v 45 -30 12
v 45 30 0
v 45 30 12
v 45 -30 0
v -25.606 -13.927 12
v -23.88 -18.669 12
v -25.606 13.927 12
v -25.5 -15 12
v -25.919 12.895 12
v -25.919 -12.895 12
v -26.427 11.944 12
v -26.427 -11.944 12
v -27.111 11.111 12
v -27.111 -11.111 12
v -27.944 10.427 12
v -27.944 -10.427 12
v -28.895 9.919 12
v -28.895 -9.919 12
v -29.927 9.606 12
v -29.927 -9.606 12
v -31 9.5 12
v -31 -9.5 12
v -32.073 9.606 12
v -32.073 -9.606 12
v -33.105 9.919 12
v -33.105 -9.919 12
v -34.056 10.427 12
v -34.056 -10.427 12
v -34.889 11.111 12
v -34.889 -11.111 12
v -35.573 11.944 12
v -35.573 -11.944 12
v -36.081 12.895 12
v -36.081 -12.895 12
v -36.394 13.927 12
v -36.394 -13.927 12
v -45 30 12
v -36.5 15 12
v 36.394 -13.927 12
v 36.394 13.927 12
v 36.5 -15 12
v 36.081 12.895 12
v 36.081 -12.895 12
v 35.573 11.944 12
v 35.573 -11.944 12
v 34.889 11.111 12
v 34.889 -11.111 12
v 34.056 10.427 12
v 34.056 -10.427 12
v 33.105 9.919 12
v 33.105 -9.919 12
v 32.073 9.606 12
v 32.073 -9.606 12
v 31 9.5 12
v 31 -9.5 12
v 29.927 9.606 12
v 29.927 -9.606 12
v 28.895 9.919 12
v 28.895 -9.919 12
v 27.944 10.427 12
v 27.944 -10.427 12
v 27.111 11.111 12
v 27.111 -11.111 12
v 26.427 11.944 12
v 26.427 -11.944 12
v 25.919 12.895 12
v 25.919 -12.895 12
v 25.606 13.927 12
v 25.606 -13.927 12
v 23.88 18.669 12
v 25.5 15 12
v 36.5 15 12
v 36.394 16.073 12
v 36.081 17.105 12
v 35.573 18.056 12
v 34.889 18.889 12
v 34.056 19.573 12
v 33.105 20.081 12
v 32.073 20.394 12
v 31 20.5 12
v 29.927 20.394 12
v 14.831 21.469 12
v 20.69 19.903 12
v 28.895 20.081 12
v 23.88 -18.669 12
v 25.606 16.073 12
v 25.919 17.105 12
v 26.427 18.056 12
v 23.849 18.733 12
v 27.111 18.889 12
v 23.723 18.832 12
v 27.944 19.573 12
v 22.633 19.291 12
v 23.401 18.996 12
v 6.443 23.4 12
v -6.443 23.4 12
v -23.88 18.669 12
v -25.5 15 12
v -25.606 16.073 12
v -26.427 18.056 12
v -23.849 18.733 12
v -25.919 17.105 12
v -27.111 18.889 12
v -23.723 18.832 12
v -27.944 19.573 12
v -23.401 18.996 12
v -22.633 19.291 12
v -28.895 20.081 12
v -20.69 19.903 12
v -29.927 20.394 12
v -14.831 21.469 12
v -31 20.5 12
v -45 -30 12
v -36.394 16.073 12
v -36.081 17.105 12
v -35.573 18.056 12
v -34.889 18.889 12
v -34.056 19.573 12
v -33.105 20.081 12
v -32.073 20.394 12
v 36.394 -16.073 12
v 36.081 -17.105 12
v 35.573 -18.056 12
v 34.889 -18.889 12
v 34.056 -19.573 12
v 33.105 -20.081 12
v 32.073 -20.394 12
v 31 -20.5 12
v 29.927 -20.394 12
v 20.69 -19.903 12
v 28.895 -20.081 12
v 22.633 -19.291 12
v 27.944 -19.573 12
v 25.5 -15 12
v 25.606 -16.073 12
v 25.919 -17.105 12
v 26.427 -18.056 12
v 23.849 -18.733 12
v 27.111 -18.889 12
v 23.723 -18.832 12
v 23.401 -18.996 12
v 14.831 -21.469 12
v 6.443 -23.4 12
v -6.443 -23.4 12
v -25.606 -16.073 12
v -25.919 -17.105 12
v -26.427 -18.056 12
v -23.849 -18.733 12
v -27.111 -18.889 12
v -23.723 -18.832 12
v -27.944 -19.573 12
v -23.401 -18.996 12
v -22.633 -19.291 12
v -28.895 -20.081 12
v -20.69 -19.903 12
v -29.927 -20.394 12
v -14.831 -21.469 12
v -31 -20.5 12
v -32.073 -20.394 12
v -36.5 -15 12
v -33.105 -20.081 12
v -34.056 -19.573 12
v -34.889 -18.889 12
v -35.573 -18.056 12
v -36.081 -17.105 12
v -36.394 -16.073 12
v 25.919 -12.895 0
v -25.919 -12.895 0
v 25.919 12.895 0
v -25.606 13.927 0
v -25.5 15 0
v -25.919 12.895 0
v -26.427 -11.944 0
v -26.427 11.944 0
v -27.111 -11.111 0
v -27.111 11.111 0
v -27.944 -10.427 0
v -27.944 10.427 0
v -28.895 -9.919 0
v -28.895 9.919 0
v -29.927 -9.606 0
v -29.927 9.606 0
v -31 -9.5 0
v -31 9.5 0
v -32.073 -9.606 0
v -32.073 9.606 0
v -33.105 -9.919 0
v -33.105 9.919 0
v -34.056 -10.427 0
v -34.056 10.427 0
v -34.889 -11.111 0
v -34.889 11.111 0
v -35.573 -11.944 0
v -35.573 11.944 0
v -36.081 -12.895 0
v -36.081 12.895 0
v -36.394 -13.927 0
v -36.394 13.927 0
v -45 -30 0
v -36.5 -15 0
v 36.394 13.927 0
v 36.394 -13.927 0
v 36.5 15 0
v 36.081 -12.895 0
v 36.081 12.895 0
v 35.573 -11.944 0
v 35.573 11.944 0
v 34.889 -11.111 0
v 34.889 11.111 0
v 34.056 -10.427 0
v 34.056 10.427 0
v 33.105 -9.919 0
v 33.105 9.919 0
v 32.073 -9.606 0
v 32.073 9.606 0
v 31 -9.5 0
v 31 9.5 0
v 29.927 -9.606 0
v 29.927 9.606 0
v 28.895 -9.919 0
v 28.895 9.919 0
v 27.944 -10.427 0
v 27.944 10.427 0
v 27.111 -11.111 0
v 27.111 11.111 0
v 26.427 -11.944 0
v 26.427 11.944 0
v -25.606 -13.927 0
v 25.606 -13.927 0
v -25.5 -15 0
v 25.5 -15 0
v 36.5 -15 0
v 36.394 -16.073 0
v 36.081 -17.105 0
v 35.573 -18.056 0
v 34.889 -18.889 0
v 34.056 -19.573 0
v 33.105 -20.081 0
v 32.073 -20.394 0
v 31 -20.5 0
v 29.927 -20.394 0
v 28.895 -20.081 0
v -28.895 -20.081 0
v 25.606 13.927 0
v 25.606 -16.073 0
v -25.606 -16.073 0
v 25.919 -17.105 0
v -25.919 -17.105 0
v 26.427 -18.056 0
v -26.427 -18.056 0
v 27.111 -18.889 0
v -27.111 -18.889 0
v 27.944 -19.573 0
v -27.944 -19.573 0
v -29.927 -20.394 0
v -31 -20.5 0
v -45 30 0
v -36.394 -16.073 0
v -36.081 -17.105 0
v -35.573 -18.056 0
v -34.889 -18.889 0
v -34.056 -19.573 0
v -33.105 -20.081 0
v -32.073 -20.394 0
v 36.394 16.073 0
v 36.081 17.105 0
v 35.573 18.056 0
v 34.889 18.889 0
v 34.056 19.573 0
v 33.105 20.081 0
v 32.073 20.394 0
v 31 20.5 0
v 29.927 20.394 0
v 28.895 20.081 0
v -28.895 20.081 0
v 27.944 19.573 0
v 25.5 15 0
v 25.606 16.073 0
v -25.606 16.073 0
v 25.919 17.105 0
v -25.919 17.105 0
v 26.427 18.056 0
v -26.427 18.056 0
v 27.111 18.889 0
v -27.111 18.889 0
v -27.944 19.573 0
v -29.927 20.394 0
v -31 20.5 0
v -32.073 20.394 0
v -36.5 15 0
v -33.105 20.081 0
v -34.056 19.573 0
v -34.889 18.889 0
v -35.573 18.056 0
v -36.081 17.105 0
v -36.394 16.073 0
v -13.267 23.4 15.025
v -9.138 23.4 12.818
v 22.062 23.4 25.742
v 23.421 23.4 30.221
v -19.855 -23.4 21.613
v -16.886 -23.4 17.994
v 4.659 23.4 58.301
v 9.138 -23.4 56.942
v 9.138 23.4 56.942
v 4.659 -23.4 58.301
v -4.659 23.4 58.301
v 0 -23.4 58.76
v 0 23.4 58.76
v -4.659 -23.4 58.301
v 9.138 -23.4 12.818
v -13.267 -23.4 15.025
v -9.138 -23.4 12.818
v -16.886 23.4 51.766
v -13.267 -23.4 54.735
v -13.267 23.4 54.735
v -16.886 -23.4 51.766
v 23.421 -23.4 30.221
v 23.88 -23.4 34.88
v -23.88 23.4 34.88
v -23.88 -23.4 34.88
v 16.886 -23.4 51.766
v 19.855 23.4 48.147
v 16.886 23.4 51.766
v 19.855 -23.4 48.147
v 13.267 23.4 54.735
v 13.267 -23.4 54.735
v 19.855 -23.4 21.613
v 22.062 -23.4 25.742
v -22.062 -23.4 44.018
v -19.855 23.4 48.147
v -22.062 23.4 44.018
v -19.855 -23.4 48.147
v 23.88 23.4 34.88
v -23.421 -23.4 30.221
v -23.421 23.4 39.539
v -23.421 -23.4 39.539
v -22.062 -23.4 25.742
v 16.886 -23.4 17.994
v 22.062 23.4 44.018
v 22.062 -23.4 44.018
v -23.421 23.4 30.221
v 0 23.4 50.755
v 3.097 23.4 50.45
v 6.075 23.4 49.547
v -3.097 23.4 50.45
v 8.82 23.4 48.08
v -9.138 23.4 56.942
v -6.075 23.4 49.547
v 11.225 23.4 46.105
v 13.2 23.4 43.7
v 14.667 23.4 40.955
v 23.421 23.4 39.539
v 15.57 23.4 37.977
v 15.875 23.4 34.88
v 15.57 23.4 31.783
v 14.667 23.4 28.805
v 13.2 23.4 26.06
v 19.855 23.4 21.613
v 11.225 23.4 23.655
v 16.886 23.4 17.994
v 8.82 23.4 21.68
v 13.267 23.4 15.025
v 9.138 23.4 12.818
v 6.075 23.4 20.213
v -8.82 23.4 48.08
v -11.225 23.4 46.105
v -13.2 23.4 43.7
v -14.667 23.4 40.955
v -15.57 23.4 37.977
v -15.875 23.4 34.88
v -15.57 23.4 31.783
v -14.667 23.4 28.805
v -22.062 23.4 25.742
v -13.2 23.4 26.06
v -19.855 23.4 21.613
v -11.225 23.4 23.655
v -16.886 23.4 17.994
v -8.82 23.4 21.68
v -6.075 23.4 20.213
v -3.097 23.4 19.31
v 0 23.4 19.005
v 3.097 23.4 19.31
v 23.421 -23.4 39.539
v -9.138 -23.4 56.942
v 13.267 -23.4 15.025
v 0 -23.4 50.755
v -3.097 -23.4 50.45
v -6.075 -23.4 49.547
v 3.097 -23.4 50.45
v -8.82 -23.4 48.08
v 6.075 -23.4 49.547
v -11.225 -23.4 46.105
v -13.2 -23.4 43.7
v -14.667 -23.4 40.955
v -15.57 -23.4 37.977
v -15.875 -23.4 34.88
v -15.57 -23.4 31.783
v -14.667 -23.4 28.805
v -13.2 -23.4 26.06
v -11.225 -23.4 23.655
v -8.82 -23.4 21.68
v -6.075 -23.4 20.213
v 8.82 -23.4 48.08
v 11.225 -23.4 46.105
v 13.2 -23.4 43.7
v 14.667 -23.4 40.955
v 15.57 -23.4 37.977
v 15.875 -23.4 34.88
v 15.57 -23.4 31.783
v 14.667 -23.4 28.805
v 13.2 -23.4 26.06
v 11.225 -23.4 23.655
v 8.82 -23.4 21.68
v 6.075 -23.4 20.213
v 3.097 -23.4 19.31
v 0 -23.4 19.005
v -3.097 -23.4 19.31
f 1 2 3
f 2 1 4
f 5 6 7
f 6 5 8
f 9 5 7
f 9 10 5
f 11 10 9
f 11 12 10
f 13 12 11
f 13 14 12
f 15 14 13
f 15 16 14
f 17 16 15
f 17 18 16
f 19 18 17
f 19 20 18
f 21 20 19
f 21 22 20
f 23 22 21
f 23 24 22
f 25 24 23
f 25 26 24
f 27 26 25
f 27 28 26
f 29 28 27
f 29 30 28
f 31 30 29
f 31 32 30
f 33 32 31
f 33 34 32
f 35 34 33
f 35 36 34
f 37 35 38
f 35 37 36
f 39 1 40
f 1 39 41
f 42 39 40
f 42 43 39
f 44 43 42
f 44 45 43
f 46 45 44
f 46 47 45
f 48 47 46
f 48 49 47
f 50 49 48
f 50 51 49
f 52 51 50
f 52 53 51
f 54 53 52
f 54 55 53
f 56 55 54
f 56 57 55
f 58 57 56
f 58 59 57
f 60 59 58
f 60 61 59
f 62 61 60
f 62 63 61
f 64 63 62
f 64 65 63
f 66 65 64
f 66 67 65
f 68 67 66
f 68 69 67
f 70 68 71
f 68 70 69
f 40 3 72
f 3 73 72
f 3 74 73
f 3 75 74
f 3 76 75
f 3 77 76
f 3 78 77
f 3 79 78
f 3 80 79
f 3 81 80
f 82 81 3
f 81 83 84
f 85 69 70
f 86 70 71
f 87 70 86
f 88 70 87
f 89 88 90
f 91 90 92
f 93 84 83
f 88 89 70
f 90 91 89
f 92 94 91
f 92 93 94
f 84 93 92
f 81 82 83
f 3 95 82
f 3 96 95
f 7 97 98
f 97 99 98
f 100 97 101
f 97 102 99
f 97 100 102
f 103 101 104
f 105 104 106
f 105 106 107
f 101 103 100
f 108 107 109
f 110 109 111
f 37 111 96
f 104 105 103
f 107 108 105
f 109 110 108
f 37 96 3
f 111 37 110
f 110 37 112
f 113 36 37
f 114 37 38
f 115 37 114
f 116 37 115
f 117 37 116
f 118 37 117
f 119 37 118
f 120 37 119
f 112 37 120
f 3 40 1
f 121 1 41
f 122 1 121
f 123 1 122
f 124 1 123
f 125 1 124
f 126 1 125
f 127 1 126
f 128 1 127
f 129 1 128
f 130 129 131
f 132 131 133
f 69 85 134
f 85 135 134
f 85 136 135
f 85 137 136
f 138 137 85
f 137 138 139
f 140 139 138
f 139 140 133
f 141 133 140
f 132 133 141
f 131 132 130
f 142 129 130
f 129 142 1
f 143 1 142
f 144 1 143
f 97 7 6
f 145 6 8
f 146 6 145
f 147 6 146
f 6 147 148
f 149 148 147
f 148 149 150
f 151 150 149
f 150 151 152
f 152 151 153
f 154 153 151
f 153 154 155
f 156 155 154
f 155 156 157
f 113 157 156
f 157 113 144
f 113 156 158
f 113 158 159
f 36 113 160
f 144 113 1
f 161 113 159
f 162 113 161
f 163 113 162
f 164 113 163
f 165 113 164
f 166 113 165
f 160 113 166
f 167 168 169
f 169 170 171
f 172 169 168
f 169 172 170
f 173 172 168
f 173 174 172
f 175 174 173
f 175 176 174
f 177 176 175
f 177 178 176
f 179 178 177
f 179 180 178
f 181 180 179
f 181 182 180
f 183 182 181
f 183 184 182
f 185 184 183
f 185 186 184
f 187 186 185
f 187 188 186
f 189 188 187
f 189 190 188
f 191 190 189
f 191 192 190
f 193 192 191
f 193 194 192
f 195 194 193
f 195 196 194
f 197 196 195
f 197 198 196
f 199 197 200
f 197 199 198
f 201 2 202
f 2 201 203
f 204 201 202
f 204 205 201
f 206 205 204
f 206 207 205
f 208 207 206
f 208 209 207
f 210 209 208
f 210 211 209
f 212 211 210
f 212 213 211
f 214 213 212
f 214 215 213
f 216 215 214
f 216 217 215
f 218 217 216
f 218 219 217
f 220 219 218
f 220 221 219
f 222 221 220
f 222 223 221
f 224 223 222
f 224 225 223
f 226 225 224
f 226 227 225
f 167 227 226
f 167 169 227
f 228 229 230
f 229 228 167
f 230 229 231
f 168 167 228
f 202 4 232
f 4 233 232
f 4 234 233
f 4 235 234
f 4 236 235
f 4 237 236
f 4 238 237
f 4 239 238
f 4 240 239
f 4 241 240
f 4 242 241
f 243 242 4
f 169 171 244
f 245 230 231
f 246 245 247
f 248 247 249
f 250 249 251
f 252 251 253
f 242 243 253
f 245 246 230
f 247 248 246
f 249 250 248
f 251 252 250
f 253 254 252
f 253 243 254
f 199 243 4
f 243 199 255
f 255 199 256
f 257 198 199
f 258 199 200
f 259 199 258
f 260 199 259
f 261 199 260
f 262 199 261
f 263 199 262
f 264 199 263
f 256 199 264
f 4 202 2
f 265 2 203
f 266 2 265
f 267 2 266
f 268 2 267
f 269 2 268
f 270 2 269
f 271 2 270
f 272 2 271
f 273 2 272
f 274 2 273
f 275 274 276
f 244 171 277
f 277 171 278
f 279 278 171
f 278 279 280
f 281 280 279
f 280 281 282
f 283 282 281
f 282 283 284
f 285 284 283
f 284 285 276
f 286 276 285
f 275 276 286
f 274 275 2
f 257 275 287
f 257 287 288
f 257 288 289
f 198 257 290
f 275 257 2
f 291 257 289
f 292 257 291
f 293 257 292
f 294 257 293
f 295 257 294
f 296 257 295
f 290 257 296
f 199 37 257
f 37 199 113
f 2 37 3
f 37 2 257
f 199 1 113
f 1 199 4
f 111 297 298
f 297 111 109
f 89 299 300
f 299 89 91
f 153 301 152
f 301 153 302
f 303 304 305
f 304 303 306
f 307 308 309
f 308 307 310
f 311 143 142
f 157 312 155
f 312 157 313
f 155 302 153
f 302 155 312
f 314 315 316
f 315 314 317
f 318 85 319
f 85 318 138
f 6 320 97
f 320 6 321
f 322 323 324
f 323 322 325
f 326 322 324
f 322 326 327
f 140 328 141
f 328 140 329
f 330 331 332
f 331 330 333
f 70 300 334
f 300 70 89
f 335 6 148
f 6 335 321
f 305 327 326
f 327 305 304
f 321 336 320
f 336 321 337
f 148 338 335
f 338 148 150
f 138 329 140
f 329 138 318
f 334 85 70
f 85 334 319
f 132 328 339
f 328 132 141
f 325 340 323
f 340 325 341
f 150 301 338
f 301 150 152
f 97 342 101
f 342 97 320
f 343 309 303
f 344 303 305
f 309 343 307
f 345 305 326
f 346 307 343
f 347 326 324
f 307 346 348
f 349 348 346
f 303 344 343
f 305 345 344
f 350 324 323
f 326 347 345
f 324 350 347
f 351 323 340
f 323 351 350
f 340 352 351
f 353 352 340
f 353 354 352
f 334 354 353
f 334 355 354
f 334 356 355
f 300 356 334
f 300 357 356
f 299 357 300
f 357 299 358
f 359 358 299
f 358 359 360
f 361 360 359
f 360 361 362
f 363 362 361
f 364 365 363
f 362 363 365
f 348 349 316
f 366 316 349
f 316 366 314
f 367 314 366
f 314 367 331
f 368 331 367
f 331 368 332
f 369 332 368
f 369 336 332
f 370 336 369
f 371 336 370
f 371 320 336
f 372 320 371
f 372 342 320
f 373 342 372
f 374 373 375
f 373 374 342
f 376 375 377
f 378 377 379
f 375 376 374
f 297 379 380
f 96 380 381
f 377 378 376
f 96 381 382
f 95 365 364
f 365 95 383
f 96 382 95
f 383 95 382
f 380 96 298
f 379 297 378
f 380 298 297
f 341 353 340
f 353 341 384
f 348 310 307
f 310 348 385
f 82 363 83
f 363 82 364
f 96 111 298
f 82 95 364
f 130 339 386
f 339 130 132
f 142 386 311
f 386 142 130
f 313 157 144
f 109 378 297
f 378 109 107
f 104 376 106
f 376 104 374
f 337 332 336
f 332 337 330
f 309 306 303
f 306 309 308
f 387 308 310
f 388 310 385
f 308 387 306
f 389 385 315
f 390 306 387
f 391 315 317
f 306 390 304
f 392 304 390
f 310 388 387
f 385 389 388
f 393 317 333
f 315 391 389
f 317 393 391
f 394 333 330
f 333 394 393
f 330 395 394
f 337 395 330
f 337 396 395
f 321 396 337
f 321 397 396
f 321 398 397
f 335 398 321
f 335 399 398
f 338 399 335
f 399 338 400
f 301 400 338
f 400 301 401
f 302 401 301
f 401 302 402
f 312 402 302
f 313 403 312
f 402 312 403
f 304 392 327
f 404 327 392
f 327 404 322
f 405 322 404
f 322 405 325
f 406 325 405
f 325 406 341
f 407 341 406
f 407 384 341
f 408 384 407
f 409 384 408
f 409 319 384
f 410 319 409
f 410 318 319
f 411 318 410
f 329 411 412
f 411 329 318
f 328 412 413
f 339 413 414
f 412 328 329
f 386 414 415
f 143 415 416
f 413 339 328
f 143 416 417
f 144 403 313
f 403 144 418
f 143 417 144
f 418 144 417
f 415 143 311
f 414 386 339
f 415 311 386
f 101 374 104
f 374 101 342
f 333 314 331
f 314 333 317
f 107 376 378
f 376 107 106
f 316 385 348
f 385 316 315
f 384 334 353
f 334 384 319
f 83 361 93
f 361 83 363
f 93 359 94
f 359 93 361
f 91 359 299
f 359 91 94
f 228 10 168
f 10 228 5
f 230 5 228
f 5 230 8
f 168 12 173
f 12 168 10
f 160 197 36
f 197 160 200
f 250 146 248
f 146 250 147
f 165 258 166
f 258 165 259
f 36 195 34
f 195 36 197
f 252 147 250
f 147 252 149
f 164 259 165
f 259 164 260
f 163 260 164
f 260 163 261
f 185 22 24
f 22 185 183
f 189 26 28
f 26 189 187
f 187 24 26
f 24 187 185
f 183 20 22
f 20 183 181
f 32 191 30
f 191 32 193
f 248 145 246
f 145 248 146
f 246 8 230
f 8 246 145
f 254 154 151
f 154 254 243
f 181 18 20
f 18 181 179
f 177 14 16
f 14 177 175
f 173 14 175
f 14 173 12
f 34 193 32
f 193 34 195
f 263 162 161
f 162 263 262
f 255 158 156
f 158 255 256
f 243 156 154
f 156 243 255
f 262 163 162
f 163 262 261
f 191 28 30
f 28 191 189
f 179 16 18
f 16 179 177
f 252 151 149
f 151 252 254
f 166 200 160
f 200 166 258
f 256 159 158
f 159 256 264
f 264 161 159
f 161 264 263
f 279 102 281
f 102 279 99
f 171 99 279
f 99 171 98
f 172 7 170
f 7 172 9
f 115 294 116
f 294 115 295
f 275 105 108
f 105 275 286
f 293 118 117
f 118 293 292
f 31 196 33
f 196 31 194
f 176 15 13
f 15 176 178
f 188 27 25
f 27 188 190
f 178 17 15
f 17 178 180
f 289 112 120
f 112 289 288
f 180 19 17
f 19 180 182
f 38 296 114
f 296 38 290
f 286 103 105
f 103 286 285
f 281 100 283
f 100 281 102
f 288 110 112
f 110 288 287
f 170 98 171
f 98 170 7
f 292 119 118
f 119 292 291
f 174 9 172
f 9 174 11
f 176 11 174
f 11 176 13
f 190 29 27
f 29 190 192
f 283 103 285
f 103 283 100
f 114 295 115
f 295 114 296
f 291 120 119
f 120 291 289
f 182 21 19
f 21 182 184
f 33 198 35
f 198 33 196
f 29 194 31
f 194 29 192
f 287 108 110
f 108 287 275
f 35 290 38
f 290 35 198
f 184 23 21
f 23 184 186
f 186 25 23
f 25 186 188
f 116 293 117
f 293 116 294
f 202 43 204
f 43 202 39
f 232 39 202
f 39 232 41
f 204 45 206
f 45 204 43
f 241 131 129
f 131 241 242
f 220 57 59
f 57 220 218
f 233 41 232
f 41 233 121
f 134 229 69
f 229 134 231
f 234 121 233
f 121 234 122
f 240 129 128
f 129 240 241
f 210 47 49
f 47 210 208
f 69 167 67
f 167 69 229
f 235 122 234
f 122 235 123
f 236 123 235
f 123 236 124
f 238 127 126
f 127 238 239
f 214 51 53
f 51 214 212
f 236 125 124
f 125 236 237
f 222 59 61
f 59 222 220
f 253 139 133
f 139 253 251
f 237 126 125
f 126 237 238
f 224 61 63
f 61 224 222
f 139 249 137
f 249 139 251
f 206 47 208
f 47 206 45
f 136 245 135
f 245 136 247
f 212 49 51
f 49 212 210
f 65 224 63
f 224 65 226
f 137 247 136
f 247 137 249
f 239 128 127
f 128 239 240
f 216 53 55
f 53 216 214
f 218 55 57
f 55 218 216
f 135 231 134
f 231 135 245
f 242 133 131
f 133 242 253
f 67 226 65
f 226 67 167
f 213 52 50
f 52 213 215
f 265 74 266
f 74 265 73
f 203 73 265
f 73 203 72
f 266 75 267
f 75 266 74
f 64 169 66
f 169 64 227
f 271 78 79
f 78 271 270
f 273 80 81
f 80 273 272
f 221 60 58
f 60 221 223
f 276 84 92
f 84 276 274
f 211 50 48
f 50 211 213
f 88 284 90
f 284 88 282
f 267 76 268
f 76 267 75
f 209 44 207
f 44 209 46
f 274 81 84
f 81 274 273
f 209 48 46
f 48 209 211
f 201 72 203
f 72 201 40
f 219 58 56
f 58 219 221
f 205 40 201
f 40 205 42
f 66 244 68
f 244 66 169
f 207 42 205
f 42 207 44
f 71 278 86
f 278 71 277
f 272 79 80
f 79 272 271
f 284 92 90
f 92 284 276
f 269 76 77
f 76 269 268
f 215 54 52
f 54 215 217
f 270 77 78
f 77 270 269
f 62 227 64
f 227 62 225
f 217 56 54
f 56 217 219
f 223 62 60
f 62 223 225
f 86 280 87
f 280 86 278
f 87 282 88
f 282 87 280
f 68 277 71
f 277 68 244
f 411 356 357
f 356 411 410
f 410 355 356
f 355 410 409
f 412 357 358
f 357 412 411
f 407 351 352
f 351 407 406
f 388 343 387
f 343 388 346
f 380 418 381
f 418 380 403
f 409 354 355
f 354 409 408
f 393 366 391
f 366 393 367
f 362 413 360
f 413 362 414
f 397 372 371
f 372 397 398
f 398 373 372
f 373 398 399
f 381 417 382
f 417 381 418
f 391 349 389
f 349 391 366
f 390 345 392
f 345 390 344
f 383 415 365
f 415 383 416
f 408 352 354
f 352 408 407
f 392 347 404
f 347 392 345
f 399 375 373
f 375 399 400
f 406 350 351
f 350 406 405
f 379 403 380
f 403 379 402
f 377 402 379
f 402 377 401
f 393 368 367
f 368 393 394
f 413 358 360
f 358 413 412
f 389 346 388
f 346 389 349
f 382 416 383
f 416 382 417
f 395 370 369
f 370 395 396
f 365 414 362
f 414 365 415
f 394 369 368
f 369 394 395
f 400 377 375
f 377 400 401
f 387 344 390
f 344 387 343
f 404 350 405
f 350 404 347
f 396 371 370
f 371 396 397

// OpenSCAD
$fn = 32;

// ----------------------------------------------------------------------
// Bearing block: 90 x 60 mm base, 31.75 mm bore at 34.88 mm
// ----------------------------------------------------------------------

// --- parameters (mm) ---
base_w = 90;              // base width
base_d = 60;              // base depth
base_t = 12;              // base thickness
bore_d = 31.75;           // shaft / bearing bore
house_r = 23.88;          // housing outer radius
house_len = 46.8;         // housing length along the shaft
foot_w = 47.76;           // foot width under the housing
foot_len = 36.8;          // foot length along the shaft
axis_z = 34.88;           // bore axis height above the base
holes_d = 11;             // mounting holes
hole_x = 31;              // mounting hole spacing

difference() {
  union() {
    /* base plate with its underside on z = 0 */
    translate([0, 0, base_t / 2]) cube([base_w, base_d, base_t], center = true);
    /* hull foot: a straight web blending into the round housing */
    hull() {
      translate([0, 0, base_t - 0.5]) cube([foot_w, foot_len, 1.6], center = true);
      translate([0, 0, axis_z]) rotate([-90, 0, 0]) cylinder(h = house_len, d = 2 * house_r, center = true);
    }
  }
  /* bore through the housing, 2.5 mm clear on both sides */
  translate([0, 0, axis_z]) rotate([-90, 0, 0]) cylinder(h = house_len + 5, d = bore_d, center = true);
  /* mounting holes through the base plate */
  for (hx = [-31, 31]) {
    for (hy = [-15, 15]) {
      translate([hx, hy, -2.5]) cylinder(h = base_t + 5, d = holes_d);
    }
  }
}
